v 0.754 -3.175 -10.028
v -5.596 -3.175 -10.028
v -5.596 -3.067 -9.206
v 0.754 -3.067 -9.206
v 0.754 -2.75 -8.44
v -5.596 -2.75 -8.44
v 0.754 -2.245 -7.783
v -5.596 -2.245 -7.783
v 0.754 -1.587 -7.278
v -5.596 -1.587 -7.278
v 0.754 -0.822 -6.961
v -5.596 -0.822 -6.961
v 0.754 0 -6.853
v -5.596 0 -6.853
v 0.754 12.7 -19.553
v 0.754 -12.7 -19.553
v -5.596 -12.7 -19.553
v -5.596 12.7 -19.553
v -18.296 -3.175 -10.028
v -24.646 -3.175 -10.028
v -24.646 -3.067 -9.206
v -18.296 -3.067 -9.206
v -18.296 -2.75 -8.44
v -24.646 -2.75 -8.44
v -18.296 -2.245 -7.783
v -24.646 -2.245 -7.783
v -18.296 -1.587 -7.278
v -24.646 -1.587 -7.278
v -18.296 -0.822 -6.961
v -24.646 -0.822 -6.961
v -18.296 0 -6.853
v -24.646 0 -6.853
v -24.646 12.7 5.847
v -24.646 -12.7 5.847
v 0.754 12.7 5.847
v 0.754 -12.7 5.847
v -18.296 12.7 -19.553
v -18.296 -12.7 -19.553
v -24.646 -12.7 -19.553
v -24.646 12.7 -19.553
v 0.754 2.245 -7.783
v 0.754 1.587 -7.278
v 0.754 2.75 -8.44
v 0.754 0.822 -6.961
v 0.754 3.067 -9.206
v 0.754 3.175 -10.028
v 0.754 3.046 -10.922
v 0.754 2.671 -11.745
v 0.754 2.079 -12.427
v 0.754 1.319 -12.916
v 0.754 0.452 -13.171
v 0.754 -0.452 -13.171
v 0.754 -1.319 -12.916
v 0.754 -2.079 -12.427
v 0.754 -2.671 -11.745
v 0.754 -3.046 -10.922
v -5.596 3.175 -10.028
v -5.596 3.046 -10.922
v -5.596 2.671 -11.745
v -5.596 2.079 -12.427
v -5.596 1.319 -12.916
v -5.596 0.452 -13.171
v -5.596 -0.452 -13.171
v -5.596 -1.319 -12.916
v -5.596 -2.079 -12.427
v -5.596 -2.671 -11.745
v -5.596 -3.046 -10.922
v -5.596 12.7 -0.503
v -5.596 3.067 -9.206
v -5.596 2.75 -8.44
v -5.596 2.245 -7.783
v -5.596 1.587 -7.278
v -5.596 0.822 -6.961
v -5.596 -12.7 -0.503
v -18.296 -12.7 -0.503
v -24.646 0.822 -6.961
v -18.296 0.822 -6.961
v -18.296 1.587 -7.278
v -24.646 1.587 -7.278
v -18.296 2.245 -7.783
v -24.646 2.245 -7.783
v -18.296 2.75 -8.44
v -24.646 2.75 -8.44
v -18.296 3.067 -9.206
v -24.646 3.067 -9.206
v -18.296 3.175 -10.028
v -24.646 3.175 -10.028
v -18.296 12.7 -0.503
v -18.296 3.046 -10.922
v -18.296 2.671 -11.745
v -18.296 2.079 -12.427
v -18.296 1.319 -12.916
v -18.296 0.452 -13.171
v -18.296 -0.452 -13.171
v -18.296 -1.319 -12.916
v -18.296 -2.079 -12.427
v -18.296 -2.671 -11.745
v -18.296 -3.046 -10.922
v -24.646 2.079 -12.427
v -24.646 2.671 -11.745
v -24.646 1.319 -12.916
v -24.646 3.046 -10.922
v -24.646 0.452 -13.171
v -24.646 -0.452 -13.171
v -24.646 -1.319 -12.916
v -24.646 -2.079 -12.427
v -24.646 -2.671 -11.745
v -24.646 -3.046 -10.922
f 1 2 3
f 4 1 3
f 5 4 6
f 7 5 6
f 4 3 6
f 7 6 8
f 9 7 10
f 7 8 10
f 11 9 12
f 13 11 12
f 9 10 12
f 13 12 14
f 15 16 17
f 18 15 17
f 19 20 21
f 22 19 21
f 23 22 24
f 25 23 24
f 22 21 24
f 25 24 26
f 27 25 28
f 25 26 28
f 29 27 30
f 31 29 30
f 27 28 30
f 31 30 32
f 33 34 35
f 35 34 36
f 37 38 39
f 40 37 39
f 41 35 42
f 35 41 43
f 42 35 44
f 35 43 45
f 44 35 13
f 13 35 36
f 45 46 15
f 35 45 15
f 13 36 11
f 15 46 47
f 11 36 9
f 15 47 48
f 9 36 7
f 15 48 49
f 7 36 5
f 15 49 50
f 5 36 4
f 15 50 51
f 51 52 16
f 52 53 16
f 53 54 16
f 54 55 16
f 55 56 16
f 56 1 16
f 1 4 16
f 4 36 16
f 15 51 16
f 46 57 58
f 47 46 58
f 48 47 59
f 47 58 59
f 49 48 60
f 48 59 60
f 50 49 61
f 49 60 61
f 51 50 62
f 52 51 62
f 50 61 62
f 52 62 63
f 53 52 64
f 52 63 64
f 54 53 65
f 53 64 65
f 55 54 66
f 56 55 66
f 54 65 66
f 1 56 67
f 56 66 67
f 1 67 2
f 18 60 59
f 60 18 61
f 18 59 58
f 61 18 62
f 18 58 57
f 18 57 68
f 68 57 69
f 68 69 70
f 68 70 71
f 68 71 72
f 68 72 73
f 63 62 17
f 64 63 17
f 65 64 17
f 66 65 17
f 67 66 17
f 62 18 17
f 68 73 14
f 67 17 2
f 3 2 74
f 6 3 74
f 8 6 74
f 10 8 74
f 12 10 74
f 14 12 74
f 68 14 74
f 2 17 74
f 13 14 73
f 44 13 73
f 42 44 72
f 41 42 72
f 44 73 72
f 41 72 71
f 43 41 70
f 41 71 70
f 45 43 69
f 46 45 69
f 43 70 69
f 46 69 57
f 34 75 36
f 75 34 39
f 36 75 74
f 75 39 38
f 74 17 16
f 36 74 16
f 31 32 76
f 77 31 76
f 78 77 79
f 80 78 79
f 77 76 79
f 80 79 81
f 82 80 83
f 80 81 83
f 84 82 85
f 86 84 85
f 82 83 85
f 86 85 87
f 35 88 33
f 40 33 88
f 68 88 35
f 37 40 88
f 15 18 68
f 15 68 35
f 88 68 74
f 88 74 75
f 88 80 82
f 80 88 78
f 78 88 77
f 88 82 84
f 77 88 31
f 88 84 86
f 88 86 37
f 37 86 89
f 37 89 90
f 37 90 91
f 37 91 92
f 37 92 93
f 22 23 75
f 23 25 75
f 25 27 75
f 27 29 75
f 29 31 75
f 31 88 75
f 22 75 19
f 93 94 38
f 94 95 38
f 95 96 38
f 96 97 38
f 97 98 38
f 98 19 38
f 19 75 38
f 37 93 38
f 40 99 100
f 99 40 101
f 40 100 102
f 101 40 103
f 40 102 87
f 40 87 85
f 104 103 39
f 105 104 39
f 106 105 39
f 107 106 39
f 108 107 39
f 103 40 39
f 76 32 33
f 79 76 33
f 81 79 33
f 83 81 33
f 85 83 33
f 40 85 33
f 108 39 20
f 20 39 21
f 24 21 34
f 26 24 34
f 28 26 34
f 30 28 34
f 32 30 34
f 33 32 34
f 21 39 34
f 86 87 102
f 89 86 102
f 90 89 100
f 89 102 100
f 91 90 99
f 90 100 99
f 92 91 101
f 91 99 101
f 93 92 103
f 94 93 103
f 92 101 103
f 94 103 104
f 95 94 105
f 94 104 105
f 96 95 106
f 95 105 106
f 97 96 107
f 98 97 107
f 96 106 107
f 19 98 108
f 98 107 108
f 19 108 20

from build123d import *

# Parameters (mm, degrees)
BOSS_EXTRUDE1_DEPTH      = 12.7
BOSS_EXTRUDE1_DEPTH_BACK = 12.7
SKETCH3_R                = 3.175
CUT_EXTRUDE1_DEPTH       = 35.478524438


with BuildPart() as part:
    # Sketch1 → Boss-Extrude1 (new, two sides: drawn at the far end of the back side and taken through both)
    with BuildSketch(Plane(origin=(0, 0, 0), x_dir=(1, 0, 0), z_dir=(0, 1, 0)).offset(-BOSS_EXTRUDE1_DEPTH_BACK)):
        Polygon((-24.645544554, -5.847029703), (0.754455446, -5.847029703), (0.754455446, 19.552970297), (-5.595544554, 19.552970297), (-5.595544554, 0.502970297), (-18.295544554, 0.502970297), (-18.295544554, 19.552970297), (-24.645544554, 19.552970297), align=None)
    extrude(amount=BOSS_EXTRUDE1_DEPTH + BOSS_EXTRUDE1_DEPTH_BACK)

    # Sketch3 → Cut-Extrude1 (cut, through all)
    with BuildSketch(Plane.ZY.offset(24.645544554)):
        with Locations((-10.027970297, 0)):
            Circle(SKETCH3_R)
    extrude(amount=-CUT_EXTRUDE1_DEPTH, mode=Mode.SUBTRACT)


solid = part.part
